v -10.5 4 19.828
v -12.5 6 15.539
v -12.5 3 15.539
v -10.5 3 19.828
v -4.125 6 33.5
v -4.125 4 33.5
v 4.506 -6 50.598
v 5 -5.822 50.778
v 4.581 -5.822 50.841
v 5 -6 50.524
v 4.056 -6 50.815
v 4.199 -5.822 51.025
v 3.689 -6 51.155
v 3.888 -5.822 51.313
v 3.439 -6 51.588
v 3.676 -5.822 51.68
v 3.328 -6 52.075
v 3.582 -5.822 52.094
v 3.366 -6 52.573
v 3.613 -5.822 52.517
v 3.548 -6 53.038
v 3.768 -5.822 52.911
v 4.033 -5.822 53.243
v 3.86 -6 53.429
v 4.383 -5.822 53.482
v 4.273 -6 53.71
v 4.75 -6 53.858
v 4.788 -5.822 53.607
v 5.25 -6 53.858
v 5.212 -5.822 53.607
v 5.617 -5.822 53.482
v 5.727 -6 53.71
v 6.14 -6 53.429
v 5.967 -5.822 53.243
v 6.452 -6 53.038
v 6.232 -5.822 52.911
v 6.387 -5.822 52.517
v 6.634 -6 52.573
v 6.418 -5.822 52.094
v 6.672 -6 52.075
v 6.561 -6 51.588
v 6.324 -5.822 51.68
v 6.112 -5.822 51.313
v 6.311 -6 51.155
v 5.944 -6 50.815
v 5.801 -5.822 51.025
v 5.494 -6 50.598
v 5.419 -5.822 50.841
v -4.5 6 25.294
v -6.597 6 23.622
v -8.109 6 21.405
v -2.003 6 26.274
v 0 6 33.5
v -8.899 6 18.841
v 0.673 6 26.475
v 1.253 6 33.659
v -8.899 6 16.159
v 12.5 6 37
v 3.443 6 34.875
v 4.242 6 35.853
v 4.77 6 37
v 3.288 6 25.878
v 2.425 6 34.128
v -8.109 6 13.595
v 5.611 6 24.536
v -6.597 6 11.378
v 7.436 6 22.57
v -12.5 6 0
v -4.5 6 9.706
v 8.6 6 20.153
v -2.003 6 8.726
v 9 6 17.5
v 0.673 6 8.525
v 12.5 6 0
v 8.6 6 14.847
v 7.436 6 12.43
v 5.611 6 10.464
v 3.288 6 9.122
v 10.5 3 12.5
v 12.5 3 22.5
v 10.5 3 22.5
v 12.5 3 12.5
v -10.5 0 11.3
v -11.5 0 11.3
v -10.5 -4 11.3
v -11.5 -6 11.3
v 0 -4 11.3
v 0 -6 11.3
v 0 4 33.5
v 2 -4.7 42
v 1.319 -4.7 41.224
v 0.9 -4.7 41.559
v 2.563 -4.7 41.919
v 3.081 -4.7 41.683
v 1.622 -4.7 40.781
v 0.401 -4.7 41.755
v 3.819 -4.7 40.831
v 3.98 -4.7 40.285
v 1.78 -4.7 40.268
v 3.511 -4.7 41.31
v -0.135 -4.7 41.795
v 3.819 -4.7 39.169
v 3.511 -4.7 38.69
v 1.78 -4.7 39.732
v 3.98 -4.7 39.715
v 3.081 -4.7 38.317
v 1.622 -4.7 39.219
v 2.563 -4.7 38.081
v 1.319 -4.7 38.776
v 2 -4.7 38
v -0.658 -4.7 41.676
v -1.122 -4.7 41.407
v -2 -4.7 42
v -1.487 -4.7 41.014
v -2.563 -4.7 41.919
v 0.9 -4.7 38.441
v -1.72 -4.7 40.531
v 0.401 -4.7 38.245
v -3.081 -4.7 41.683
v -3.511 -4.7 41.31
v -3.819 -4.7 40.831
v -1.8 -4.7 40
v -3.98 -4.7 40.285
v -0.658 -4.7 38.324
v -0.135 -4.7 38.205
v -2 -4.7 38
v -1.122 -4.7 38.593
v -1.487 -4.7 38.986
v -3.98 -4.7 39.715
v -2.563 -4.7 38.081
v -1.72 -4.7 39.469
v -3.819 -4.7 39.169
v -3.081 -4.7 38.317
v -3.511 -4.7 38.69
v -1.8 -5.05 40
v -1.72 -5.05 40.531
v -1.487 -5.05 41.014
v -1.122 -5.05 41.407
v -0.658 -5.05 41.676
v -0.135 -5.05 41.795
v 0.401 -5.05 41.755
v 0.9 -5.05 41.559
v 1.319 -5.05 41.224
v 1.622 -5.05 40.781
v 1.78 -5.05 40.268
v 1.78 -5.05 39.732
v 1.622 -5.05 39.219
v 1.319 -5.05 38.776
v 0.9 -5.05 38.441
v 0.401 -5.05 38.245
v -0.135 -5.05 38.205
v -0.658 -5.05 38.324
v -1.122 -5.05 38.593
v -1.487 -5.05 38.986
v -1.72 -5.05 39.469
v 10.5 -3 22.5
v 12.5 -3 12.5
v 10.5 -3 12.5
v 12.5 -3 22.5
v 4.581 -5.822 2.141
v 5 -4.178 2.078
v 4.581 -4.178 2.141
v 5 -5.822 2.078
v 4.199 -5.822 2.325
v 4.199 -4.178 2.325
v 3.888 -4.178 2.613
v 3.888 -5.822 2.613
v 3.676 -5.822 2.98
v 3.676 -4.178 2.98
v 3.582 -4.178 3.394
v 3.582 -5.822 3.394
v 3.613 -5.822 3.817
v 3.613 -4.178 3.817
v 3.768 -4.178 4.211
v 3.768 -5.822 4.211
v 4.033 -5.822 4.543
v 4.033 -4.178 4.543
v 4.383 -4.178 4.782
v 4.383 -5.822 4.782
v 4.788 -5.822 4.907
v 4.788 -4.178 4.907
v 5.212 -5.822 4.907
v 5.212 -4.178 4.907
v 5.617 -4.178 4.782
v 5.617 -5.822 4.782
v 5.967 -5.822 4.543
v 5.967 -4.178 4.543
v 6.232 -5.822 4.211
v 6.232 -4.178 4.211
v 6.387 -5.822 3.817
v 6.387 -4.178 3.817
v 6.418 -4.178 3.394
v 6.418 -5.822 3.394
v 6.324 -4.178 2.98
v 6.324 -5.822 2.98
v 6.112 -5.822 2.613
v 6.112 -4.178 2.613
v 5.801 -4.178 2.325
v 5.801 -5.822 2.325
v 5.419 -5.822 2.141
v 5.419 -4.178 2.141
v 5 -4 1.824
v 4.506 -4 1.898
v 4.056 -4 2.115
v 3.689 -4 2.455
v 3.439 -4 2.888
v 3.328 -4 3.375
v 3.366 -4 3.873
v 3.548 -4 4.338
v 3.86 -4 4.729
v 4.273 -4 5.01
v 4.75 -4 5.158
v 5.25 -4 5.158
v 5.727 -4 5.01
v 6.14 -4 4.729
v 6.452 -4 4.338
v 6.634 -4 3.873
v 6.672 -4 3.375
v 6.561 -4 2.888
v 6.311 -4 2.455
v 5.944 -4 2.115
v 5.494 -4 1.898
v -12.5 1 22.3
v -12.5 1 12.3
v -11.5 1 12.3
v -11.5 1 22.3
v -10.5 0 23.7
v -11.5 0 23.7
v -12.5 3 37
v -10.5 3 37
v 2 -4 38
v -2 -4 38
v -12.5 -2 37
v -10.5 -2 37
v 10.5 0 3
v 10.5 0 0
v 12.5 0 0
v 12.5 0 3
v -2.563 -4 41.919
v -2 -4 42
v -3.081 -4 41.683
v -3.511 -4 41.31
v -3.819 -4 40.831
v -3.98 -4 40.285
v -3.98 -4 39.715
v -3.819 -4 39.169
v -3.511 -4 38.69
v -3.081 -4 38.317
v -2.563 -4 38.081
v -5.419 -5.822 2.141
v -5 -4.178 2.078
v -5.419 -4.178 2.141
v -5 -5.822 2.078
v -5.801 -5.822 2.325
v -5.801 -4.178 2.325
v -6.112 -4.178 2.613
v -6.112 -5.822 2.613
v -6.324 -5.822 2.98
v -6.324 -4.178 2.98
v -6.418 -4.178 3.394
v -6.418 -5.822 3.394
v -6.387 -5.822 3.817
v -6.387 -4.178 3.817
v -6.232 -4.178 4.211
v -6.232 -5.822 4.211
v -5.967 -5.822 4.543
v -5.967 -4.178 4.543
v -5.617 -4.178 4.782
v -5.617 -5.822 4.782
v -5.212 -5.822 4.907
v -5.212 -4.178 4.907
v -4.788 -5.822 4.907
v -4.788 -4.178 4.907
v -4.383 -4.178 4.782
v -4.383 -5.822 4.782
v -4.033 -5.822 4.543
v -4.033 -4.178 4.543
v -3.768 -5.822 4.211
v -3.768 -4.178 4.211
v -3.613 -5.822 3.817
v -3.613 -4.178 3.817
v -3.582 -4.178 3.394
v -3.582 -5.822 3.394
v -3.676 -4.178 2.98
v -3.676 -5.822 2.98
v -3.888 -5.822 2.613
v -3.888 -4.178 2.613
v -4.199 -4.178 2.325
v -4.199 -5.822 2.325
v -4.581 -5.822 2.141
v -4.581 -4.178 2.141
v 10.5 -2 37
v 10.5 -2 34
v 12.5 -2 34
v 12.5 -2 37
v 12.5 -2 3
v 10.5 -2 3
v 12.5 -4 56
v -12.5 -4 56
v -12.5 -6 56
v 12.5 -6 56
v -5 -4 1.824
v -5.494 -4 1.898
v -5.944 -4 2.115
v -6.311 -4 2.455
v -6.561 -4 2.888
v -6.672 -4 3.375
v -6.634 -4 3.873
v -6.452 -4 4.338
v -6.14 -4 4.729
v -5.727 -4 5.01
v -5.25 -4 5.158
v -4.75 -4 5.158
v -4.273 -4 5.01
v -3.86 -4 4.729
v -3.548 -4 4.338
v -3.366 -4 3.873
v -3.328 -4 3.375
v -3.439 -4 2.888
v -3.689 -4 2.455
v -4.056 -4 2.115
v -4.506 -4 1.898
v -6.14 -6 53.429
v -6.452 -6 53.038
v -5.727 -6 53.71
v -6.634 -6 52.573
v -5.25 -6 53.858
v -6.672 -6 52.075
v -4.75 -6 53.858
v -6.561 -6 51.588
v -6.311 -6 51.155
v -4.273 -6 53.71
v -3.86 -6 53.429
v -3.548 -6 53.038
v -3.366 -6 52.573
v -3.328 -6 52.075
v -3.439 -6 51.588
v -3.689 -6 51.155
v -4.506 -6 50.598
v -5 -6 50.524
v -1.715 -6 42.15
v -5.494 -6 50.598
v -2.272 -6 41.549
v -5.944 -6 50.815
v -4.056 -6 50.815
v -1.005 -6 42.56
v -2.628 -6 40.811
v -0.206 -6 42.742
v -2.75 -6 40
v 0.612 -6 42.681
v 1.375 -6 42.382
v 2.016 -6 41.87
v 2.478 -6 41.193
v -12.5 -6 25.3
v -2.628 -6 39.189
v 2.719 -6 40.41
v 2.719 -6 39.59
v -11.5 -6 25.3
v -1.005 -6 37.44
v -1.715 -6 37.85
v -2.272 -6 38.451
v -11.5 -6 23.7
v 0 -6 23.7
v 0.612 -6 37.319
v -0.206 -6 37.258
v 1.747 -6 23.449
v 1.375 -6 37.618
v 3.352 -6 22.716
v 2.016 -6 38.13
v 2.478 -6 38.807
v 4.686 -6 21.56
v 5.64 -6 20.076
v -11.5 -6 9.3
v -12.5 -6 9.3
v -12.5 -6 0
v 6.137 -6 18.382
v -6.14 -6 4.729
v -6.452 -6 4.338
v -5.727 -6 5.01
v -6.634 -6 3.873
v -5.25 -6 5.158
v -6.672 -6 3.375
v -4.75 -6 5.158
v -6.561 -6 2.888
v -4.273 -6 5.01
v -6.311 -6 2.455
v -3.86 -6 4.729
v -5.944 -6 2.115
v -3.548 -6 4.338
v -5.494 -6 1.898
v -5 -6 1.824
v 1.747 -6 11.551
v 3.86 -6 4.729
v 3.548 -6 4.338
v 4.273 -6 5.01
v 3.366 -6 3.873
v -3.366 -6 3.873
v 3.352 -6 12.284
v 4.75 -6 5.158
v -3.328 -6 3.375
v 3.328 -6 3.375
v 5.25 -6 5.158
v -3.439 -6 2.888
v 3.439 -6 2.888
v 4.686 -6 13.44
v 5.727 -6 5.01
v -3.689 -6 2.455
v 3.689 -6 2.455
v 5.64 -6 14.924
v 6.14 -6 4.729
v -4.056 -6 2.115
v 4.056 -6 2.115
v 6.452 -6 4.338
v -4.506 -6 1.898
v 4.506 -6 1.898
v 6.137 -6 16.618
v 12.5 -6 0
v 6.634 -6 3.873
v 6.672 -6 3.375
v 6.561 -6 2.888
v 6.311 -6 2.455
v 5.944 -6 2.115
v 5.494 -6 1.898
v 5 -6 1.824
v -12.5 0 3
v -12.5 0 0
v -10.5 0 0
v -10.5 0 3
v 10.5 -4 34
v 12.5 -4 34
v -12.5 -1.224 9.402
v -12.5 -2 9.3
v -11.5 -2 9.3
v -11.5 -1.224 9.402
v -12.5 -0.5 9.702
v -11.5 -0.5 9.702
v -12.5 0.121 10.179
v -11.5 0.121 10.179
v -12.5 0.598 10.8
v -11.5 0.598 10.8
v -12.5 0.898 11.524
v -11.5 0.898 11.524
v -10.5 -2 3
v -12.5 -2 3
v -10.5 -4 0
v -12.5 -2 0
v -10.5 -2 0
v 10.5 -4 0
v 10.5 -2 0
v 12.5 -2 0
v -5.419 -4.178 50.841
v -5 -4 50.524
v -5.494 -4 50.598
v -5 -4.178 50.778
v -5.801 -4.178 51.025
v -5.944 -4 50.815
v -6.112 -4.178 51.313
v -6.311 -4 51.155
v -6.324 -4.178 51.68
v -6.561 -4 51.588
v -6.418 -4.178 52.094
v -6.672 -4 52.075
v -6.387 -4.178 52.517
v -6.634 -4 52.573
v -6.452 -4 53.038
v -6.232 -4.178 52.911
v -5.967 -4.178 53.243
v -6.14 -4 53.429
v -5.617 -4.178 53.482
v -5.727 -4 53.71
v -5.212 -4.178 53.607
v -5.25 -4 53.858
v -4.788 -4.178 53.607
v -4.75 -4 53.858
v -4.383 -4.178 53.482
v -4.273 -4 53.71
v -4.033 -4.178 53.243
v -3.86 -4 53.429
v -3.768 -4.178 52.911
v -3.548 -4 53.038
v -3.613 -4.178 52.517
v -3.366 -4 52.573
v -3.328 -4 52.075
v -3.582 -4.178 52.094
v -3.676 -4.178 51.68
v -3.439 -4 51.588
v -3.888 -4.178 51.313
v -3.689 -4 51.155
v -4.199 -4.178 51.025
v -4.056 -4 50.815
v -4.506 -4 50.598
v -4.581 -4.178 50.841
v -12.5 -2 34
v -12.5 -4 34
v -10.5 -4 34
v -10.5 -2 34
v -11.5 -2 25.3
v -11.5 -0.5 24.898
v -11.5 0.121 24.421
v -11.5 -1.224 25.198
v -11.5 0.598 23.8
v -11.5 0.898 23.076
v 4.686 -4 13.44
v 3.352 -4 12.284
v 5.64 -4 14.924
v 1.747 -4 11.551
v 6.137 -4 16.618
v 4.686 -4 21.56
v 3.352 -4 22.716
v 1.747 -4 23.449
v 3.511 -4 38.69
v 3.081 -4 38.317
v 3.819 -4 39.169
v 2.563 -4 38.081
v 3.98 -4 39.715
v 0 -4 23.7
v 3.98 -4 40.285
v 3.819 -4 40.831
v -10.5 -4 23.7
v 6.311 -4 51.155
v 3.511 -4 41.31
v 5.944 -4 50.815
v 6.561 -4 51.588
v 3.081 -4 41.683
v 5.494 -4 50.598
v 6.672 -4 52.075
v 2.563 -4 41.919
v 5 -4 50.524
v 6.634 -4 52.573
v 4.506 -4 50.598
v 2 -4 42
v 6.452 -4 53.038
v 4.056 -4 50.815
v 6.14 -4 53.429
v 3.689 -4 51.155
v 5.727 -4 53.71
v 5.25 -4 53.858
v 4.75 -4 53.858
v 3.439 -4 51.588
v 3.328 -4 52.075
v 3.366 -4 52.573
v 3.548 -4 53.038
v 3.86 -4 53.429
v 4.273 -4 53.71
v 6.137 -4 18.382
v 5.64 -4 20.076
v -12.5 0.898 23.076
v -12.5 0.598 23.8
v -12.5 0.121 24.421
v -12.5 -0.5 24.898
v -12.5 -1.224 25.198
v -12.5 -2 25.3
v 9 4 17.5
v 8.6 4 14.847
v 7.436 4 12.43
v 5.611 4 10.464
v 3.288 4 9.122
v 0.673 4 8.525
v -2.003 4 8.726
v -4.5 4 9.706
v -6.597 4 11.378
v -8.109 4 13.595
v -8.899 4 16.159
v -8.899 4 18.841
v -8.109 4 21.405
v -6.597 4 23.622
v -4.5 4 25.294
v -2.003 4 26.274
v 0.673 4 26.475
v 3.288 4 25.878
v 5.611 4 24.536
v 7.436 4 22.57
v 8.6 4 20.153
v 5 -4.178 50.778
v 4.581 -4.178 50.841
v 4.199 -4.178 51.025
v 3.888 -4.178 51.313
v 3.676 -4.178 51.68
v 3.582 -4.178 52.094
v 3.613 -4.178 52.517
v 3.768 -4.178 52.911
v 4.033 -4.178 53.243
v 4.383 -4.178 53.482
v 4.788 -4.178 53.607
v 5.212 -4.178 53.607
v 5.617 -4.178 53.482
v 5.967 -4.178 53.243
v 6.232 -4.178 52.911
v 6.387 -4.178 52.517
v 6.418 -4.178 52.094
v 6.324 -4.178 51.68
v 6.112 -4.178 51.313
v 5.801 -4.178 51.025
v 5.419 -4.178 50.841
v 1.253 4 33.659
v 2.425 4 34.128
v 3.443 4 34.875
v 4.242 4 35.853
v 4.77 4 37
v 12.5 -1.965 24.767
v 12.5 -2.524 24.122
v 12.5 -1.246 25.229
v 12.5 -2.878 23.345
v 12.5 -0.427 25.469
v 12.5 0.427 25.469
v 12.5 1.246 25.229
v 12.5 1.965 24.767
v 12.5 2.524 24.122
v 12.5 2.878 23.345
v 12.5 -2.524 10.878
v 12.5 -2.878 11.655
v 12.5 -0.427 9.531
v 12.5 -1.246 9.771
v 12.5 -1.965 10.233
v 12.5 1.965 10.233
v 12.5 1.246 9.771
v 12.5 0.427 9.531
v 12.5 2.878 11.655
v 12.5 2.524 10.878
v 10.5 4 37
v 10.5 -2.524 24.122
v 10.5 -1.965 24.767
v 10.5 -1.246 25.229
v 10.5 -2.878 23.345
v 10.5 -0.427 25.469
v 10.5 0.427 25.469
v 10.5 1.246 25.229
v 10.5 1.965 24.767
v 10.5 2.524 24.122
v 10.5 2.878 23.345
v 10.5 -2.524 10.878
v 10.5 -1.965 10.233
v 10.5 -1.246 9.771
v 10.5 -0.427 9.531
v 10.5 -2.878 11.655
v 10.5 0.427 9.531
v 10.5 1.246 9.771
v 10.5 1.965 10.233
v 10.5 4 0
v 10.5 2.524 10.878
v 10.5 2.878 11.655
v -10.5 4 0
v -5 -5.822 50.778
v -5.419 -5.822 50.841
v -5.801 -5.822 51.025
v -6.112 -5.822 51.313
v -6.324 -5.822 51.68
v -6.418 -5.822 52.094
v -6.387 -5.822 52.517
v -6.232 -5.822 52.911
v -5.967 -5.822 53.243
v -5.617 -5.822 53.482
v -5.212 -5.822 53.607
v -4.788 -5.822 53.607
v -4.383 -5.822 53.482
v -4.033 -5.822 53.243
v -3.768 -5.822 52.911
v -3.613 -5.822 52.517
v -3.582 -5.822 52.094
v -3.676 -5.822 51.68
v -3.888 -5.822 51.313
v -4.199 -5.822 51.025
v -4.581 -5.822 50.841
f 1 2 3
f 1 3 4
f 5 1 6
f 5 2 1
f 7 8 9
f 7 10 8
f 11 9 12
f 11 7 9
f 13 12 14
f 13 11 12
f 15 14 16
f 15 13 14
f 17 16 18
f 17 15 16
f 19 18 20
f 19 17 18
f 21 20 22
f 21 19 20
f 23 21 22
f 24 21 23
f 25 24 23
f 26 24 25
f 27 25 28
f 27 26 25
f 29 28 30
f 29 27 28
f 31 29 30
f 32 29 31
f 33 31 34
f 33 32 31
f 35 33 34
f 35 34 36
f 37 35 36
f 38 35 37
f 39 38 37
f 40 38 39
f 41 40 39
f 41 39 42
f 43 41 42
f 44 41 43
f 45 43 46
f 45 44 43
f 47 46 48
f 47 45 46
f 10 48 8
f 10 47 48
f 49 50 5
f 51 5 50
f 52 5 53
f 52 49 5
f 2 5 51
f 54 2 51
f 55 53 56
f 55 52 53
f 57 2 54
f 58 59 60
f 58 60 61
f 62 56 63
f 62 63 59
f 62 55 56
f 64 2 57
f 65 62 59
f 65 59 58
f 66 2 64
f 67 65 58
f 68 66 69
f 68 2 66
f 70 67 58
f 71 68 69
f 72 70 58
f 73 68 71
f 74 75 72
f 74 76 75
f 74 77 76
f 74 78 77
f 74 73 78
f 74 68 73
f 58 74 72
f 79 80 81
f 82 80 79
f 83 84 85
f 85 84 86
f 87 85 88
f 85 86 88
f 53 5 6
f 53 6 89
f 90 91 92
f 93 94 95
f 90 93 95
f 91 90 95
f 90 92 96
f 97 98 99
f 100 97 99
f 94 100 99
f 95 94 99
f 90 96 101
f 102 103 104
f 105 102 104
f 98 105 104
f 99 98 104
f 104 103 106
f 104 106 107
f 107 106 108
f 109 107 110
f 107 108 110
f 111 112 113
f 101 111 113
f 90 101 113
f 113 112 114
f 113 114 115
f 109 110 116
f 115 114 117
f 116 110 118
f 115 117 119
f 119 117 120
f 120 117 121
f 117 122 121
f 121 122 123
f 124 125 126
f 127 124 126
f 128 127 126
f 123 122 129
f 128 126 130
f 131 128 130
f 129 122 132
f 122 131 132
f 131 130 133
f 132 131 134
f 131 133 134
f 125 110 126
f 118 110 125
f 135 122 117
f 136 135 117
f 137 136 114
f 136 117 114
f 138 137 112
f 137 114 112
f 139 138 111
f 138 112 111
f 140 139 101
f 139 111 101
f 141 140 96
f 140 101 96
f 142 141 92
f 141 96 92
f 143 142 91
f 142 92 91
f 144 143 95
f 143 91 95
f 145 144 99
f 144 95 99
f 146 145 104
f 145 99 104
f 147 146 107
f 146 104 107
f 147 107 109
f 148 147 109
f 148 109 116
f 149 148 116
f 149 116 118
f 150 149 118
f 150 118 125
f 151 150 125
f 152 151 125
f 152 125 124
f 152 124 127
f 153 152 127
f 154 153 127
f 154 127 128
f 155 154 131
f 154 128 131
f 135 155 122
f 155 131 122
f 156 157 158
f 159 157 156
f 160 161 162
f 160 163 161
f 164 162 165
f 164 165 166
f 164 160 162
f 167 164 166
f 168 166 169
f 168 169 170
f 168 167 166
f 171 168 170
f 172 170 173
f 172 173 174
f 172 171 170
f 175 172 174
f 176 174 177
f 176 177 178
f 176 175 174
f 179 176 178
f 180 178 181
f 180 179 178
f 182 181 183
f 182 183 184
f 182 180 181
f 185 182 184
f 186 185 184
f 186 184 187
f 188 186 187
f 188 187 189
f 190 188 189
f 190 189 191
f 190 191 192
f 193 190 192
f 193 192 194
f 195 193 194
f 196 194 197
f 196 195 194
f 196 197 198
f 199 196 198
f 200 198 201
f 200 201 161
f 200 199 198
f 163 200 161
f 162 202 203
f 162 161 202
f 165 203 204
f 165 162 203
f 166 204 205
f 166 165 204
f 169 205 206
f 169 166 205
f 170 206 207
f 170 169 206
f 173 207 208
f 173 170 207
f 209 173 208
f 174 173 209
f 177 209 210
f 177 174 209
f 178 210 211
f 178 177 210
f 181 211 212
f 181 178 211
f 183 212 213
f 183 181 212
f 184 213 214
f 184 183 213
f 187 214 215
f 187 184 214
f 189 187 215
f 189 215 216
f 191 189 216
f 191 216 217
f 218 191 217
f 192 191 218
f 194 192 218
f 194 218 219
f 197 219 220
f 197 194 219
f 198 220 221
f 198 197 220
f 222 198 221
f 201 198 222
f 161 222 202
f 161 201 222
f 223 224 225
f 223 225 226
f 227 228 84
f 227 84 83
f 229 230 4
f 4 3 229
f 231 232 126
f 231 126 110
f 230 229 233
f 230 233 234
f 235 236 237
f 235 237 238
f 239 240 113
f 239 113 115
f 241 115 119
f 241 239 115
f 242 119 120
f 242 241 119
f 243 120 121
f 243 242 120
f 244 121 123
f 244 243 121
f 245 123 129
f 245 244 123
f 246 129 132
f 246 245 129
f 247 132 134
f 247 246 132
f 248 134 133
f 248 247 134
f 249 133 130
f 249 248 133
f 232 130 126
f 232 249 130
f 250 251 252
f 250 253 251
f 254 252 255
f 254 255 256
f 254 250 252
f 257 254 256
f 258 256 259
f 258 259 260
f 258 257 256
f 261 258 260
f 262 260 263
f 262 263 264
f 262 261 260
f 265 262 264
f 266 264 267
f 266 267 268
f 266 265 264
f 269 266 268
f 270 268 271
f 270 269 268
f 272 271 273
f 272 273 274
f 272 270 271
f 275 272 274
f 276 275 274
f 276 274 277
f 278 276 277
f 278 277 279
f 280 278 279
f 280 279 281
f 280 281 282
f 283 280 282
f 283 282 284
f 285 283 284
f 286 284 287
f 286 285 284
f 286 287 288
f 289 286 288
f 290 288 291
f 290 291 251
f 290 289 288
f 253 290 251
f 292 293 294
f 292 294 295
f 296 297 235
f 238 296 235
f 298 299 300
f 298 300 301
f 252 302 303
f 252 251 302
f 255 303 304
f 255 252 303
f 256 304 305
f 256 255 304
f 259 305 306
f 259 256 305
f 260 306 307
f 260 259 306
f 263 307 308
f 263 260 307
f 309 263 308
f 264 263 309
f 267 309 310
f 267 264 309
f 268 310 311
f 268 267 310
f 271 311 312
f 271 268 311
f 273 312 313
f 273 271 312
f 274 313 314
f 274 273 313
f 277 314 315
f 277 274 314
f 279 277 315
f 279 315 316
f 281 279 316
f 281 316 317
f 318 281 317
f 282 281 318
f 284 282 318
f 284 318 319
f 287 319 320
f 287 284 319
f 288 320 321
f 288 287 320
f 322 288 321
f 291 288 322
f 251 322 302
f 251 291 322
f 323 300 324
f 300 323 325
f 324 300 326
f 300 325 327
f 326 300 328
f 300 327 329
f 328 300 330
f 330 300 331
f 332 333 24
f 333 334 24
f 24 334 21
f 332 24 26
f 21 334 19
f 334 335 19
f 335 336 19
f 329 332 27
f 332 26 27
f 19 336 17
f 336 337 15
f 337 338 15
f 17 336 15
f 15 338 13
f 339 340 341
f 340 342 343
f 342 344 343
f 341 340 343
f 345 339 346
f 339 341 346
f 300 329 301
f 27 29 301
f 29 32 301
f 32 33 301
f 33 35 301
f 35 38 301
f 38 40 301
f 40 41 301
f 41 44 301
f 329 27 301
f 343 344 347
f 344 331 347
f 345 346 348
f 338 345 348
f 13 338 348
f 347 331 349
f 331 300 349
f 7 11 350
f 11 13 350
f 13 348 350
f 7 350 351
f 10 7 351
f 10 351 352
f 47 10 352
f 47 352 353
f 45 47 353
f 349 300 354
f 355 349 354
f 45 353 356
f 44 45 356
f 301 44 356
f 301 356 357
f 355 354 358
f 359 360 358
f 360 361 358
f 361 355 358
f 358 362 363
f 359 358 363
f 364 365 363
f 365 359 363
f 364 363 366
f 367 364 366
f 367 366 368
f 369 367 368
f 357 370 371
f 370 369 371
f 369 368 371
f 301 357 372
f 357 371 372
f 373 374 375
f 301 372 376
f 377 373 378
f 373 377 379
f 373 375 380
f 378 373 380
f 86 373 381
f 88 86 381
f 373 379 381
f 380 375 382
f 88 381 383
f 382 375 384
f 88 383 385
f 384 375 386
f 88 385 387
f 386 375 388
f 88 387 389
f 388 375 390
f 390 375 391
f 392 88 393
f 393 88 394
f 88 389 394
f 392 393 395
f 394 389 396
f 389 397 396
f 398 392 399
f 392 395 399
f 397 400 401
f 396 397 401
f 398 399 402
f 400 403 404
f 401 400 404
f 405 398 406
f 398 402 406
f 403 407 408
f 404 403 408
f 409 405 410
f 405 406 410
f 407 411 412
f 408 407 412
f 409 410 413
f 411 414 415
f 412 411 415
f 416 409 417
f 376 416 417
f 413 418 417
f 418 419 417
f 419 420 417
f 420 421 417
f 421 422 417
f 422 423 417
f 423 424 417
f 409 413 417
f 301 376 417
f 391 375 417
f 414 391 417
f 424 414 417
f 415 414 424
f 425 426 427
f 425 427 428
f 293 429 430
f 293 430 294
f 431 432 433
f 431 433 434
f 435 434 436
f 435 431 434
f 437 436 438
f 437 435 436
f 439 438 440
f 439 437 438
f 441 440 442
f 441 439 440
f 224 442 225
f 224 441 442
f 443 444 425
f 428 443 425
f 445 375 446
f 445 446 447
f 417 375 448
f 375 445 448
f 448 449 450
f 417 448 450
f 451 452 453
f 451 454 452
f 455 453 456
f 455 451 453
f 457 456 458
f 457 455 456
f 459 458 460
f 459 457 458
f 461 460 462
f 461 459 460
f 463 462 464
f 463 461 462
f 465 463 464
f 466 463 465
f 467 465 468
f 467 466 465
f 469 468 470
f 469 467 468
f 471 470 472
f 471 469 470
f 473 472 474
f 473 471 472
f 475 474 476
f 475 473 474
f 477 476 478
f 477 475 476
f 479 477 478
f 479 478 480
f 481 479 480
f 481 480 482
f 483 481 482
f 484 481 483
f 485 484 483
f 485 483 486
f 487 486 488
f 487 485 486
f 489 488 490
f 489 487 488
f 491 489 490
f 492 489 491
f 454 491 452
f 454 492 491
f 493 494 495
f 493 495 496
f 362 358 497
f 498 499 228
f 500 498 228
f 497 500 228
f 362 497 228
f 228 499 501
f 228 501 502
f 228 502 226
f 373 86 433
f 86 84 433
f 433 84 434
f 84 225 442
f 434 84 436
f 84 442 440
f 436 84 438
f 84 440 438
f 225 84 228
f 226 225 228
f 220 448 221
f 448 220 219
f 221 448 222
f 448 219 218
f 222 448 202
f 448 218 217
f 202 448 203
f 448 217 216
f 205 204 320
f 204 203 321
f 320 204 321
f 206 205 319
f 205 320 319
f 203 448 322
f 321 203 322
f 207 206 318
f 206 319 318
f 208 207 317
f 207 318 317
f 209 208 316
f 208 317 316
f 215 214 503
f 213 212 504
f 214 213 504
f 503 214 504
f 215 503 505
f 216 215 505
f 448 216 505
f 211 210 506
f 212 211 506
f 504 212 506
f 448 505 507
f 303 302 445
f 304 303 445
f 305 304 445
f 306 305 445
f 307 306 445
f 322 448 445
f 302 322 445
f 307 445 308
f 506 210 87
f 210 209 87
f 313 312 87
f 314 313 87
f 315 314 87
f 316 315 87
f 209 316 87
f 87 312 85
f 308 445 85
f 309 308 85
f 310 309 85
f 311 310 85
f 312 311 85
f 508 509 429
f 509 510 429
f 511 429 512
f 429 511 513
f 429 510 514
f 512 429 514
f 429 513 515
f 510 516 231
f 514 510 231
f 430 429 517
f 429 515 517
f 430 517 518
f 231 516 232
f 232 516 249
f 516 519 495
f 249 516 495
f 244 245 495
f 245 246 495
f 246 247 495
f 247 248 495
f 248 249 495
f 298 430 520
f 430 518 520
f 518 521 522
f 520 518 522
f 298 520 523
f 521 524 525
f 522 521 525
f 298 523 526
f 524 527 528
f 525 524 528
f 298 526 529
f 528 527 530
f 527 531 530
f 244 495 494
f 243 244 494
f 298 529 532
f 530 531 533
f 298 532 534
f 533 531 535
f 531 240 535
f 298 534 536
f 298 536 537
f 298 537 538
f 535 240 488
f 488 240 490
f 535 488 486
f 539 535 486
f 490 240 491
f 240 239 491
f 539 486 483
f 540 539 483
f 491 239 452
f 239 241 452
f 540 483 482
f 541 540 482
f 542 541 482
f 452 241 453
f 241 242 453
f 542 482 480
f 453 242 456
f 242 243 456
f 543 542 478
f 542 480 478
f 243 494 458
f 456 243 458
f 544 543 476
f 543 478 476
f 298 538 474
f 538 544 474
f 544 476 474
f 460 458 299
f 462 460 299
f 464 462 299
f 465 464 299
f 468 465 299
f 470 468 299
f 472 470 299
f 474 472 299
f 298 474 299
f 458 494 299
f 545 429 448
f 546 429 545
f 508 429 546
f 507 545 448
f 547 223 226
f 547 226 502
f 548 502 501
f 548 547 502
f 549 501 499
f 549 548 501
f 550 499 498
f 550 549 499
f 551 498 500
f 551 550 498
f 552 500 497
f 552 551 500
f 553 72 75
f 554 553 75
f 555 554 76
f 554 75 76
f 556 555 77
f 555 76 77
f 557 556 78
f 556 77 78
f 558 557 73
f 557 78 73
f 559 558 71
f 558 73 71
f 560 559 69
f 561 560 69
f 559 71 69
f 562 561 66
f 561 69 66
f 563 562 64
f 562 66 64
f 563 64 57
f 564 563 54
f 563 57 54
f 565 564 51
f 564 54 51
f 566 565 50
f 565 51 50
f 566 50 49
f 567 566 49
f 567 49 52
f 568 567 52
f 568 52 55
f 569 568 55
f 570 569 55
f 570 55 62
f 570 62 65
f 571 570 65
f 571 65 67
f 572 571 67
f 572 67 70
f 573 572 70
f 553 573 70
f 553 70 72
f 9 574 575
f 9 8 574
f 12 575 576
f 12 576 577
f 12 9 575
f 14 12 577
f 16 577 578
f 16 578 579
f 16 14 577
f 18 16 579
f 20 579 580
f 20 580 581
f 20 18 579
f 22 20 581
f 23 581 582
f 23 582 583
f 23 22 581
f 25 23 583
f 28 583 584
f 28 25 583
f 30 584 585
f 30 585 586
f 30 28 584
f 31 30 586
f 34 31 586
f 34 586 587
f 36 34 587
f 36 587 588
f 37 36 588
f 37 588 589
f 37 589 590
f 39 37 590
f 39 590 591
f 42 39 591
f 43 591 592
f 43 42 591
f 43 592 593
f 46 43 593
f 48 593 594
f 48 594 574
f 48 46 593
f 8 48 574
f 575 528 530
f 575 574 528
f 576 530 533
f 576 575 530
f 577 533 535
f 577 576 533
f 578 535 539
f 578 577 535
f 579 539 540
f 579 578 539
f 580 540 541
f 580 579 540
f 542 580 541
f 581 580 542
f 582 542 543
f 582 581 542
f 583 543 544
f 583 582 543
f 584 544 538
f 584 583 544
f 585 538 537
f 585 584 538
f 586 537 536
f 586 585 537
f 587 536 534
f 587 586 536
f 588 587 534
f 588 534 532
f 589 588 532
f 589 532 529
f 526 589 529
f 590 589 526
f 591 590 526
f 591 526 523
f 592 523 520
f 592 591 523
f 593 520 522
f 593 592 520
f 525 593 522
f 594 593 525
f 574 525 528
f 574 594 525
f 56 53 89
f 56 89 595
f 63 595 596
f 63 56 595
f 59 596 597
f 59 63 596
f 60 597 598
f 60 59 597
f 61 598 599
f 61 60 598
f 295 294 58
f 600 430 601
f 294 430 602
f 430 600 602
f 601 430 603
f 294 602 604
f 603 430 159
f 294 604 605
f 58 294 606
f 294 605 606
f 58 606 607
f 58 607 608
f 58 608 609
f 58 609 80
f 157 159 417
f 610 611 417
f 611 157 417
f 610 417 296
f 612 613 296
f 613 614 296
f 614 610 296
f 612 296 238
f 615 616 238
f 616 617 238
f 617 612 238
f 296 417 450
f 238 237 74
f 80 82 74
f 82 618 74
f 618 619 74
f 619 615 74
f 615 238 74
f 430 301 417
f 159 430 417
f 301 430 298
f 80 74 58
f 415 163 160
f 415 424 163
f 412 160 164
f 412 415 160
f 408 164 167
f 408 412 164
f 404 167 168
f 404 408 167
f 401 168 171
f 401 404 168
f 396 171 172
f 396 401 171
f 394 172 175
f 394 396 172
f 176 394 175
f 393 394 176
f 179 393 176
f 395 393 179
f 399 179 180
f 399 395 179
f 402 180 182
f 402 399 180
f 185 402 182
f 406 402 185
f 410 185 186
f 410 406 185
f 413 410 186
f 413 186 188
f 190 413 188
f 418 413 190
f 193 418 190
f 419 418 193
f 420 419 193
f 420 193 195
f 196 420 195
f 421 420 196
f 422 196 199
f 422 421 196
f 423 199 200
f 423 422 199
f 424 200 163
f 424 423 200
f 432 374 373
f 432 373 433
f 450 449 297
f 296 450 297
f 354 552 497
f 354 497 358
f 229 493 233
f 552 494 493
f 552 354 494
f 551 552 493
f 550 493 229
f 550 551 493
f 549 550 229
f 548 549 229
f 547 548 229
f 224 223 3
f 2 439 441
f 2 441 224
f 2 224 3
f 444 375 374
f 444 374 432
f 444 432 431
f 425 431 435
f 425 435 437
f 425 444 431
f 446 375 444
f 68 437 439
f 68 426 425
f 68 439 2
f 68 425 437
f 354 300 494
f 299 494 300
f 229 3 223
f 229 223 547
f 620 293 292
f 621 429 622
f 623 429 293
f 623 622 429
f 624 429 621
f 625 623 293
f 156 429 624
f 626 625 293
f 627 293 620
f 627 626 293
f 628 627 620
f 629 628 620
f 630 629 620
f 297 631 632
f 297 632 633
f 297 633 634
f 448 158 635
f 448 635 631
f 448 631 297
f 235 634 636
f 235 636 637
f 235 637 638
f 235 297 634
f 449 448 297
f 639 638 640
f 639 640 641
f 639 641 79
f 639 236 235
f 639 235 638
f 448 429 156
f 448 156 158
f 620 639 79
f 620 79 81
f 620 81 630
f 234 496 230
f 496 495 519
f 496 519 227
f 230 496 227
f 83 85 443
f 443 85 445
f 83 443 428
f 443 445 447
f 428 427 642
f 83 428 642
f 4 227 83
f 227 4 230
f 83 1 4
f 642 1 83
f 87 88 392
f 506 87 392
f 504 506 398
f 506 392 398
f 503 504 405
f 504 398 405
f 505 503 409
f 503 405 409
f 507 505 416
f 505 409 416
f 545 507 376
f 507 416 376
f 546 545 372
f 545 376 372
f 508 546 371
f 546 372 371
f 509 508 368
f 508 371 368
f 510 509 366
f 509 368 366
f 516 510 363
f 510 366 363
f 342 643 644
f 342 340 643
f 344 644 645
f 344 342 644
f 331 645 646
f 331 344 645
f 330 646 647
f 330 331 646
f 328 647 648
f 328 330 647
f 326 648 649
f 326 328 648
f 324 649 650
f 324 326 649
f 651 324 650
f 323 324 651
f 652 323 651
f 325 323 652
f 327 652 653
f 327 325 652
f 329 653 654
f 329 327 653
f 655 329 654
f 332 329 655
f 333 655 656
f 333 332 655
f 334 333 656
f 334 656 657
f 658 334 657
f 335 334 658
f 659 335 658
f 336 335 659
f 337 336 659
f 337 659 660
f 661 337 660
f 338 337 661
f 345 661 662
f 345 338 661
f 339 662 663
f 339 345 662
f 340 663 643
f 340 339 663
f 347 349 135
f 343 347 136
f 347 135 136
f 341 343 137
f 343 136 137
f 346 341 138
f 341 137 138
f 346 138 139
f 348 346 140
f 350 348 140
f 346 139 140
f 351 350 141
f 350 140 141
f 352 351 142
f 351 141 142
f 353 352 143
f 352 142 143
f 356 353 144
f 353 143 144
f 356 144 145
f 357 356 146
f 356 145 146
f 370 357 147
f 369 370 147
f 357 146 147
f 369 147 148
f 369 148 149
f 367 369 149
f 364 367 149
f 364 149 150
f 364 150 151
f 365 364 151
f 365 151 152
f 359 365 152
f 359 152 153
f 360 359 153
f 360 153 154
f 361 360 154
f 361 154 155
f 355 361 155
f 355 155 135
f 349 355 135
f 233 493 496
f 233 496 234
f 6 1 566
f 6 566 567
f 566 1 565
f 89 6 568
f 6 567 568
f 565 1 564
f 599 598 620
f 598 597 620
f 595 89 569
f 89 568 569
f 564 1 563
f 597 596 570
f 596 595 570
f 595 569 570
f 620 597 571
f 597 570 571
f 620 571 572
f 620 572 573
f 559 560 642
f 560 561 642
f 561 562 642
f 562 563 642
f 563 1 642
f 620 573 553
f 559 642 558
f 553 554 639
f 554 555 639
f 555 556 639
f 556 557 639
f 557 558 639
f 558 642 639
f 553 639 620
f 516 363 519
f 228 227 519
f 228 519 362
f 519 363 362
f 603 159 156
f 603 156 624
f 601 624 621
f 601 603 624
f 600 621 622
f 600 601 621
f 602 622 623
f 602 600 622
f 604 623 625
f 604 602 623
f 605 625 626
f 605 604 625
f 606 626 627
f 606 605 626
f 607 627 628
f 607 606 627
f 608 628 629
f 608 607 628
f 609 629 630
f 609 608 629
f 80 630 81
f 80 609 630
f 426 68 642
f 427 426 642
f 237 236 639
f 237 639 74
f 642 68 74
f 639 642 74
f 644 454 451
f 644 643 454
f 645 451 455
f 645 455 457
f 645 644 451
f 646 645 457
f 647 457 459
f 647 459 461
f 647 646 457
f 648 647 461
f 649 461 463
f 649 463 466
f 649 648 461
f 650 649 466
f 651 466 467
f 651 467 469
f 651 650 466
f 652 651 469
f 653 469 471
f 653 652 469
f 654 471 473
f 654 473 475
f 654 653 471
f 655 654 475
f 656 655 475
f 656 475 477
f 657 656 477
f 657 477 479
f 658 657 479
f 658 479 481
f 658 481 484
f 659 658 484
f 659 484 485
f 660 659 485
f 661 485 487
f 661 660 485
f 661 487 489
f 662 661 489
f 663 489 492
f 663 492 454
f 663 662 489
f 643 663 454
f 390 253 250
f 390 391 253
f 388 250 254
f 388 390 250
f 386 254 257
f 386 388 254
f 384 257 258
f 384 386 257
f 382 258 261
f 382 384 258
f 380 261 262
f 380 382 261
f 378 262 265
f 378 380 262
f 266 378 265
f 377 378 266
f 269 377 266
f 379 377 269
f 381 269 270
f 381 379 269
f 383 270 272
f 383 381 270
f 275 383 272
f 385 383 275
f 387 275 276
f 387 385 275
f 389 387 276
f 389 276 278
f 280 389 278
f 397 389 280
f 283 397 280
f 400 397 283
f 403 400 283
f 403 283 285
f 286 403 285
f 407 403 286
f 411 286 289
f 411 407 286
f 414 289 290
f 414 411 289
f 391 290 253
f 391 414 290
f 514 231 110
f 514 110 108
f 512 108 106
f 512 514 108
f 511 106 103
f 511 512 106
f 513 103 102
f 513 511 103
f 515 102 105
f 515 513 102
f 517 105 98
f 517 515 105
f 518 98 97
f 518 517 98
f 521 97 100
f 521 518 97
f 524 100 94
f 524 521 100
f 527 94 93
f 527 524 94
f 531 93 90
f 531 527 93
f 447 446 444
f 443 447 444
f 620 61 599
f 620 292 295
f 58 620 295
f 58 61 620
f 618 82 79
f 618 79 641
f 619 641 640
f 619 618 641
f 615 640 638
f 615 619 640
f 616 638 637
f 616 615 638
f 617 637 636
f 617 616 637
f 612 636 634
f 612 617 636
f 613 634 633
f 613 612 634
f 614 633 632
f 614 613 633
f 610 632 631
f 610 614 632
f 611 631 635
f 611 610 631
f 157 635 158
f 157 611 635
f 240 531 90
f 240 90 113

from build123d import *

# Parameters (mm, degrees)
SKETCH_1_W                    = 25
SKETCH_1_H                    = 12
SKETCH_1_W_2                  = 21
SKETCH_1_H_2                  = 8
EXTRUDE_1_DEPTH               = 56
CUT_EXTRUDE_1_REACH           = 14
SKETCH_2_R                    = 9
HOLE_WIZARD_4_40_1_AT_2_COUNT = 2
HOLE_WIZARD_4_40_1_AT_2_PITCH = 48.7
HOLE_WIZARD_4_40_1_AT_3_COUNT = 2
HOLE_WIZARD_4_40_1_AT_3_PITCH = 49.716093974
HOLE_WIZARD_4_40_1_AT_4_COUNT = 2
HOLE_WIZARD_4_40_1_AT_4_PITCH = 10
CUT_EXTRUDE_2_DEPTH           = 6
CUT_EXTRUDE_4_DEPTH           = 1
SKETCH_9_W                    = 25
SKETCH_9_H                    = 19
CUT_EXTRUDE_7_DEPTH           = 10
CUT_EXTRUDE_8_REACH           = 27
CUT_EXTRUDE_9_DEPTH           = 3
SKETCH_15_W                   = 3
SKETCH_15_H                   = 2
CUT_EXTRUDE_10_DEPTH          = 26
HOLE_WIZARD_M31_D             = 3.6
HOLE_WIZARD_M31_CSINK_D       = 5.5
HOLE_WIZARD_M31_CSINK_ANGLE   = 90
CUT_EXTRUDE_11_DEPTH          = 0.7


with BuildPart() as part:
    # Sketch 1 → Extrude 1 (new body)
    with BuildSketch(Plane.XY):
        Rectangle(SKETCH_1_W, SKETCH_1_H)
        Rectangle(SKETCH_1_W_2, SKETCH_1_H_2, mode=Mode.SUBTRACT)
    extrude(amount=EXTRUDE_1_DEPTH)

    # Sketch 2 → Cut-Extrude 1 (cut, up to next)
    with BuildSketch(Plane(origin=(0, 6, 0), x_dir=(1, 0, 0), z_dir=(0, 1, 0)), mode=Mode.PRIVATE) as cut_extrude_1_sk1:
        with Locations((0, -17.5)):
            Circle(SKETCH_2_R)
    cut_extrude_1_tool1 = extrude(cut_extrude_1_sk1.sketch, amount=-CUT_EXTRUDE_1_REACH, mode=Mode.PRIVATE) & part.part
    add(cut_extrude_1_tool1.solids().sort_by_distance((0, 6, 17.5))[0], mode=Mode.SUBTRACT)

    # Sketch 3 → Hole Wizard 4-40 - 1 (revolve, cut)
    with BuildSketch(Plane(origin=(5, -6, 52.2), x_dir=(0, 0, -1), z_dir=(1, 0, 0))):
        Polygon((0, 0), (0, 2), (1.6764, 2), (1.4224, 1.822147285), (1.4224, 0.177852715), (1.6764, 0), align=None)
    hole_wizard_4_40_1 = revolve(axis=Axis((5, -12.35, 52.2), (0, 1, 0)), mode=Mode.SUBTRACT)

    # Hole Wizard 4-40 - 1 at 2: Hole Wizard 4-40 - 1 ×2
    with Locations(*[(0, 0, -i * HOLE_WIZARD_4_40_1_AT_2_PITCH) for i in range(1, HOLE_WIZARD_4_40_1_AT_2_COUNT)]):
        add(hole_wizard_4_40_1, mode=Mode.SUBTRACT)

    # Hole Wizard 4-40 - 1 at 3: Hole Wizard 4-40 - 1 ×2
    with Locations(*[Vector(-0.201142109, 0, -0.979562072) * (i * HOLE_WIZARD_4_40_1_AT_3_PITCH) for i in range(1, HOLE_WIZARD_4_40_1_AT_3_COUNT)]):
        add(hole_wizard_4_40_1, mode=Mode.SUBTRACT)

    # Hole Wizard 4-40 - 1 at 4: Hole Wizard 4-40 - 1 ×2
    with Locations(*[(-i * HOLE_WIZARD_4_40_1_AT_4_PITCH, 0, 0) for i in range(1, HOLE_WIZARD_4_40_1_AT_4_COUNT)]):
        add(hole_wizard_4_40_1, mode=Mode.SUBTRACT)

    # Sketch 5 → Cut-Extrude 2 (cut)
    with BuildSketch(Plane.XZ.offset(6)):
        with BuildLine():
            Line((-12.5, 23.7), (-12.5, 11.3))
            Line((-12.5, 11.3), (0, 11.3))
            ThreePointArc((0, 11.3), (6.2, 17.5), (0, 23.7))
            Line((0, 23.7), (-12.5, 23.7))
        make_face()
    extrude(amount=-CUT_EXTRUDE_2_DEPTH, mode=Mode.SUBTRACT)

    # Sketch 8 → Cut-Extrude 4 (cut)
    with BuildSketch(Plane.ZY.offset(12.5)):
        with BuildLine():
            Line((9.3, -6), (9.3, -2))
            ThreePointArc((9.3, -2), (10.178679656, 0.121320344), (12.3, 1))
            Line((12.3, 1), (22.3, 1))
            ThreePointArc((22.3, 1), (24.421320344, 0.121320344), (25.3, -2))
            Line((25.3, -2), (25.3, -6))
            Line((25.3, -6), (9.3, -6))
        make_face()
    extrude(amount=-CUT_EXTRUDE_4_DEPTH, mode=Mode.SUBTRACT)

    # Sketch 9 → Cut-Extrude 7 (cut)
    with BuildSketch(Plane(origin=(0, 6, 0), x_dir=(1, 0, 0), z_dir=(0, 1, 0))):
        with Locations((0, -46.5)):
            Rectangle(SKETCH_9_W, SKETCH_9_H)
    extrude(amount=-CUT_EXTRUDE_7_DEPTH, mode=Mode.SUBTRACT)

    # Sketch 13 → Cut-Extrude 8 (cut, up to next)
    with BuildSketch(Plane(origin=(12.5, 0, 0), x_dir=(0, 0, -1), z_dir=(1, 0, 0)), mode=Mode.PRIVATE) as cut_extrude_8_sk1:
        with BuildLine():
            Line((-22.5, 3), (-12.5, 3))
            ThreePointArc((-12.5, 3), (-9.5, 0), (-12.5, -3))
            Line((-12.5, -3), (-22.5, -3))
            ThreePointArc((-22.5, -3), (-25.5, 0), (-22.5, 3))
        make_face()
    cut_extrude_8_tool1 = extrude(cut_extrude_8_sk1.sketch, amount=-CUT_EXTRUDE_8_REACH, mode=Mode.PRIVATE) & part.part
    add(cut_extrude_8_tool1.solids().sort_by_distance((12.5, 0, 17.5))[0], mode=Mode.SUBTRACT)

    # Sketch 14 → Cut-Extrude 9 (cut)
    with BuildSketch(Plane(origin=(0, 6, 0), x_dir=(1, 0, 0), z_dir=(0, 1, 0))):
        with BuildLine():
            Line((-4.124545619, -33.5), (0, -33.5))
            ThreePointArc((0, -33.5), (2.958039892, -34.468871126), (4.769696007, -37))
            Line((4.769696007, -37), (-12.5, -37))
            Line((-12.5, -37), (-12.5, -15.538780117))
            Line((-12.5, -15.538780117), (-4.124545619, -33.5))
        make_face()
    extrude(amount=-CUT_EXTRUDE_9_DEPTH, mode=Mode.SUBTRACT)

    # Sketch 15 → Cut-Extrude 10 (cut, through all)
    with BuildSketch(Plane.ZY.offset(12.5)):
        with Locations((35.5, -3)):
            Rectangle(SKETCH_15_W, SKETCH_15_H)
        with Locations((1.5, -1)):
            Rectangle(SKETCH_15_W, SKETCH_15_H)
    extrude(amount=-CUT_EXTRUDE_10_DEPTH, mode=Mode.SUBTRACT)

    # Hole Wizard M31 (through all)
    with Locations(Plane.XZ.offset(6)):
        with Locations((0, 40)):
            CounterSinkHole(HOLE_WIZARD_M31_D / 2, HOLE_WIZARD_M31_CSINK_D / 2, counter_sink_angle=HOLE_WIZARD_M31_CSINK_ANGLE)

    # Sketch 18 → Cut-Extrude 11 (cut)
    with BuildSketch(Plane(origin=(0, -4, 0), x_dir=(1, 0, 0), z_dir=(0, 1, 0))):
        with BuildLine():
            Line((-2, -38), (2, -38))
            ThreePointArc((2, -38), (4, -40), (2, -42))
            Line((2, -42), (-2, -42))
            ThreePointArc((-2, -42), (-4, -40), (-2, -38))
        make_face()
    extrude(amount=-CUT_EXTRUDE_11_DEPTH, mode=Mode.SUBTRACT)


solid = part.part
